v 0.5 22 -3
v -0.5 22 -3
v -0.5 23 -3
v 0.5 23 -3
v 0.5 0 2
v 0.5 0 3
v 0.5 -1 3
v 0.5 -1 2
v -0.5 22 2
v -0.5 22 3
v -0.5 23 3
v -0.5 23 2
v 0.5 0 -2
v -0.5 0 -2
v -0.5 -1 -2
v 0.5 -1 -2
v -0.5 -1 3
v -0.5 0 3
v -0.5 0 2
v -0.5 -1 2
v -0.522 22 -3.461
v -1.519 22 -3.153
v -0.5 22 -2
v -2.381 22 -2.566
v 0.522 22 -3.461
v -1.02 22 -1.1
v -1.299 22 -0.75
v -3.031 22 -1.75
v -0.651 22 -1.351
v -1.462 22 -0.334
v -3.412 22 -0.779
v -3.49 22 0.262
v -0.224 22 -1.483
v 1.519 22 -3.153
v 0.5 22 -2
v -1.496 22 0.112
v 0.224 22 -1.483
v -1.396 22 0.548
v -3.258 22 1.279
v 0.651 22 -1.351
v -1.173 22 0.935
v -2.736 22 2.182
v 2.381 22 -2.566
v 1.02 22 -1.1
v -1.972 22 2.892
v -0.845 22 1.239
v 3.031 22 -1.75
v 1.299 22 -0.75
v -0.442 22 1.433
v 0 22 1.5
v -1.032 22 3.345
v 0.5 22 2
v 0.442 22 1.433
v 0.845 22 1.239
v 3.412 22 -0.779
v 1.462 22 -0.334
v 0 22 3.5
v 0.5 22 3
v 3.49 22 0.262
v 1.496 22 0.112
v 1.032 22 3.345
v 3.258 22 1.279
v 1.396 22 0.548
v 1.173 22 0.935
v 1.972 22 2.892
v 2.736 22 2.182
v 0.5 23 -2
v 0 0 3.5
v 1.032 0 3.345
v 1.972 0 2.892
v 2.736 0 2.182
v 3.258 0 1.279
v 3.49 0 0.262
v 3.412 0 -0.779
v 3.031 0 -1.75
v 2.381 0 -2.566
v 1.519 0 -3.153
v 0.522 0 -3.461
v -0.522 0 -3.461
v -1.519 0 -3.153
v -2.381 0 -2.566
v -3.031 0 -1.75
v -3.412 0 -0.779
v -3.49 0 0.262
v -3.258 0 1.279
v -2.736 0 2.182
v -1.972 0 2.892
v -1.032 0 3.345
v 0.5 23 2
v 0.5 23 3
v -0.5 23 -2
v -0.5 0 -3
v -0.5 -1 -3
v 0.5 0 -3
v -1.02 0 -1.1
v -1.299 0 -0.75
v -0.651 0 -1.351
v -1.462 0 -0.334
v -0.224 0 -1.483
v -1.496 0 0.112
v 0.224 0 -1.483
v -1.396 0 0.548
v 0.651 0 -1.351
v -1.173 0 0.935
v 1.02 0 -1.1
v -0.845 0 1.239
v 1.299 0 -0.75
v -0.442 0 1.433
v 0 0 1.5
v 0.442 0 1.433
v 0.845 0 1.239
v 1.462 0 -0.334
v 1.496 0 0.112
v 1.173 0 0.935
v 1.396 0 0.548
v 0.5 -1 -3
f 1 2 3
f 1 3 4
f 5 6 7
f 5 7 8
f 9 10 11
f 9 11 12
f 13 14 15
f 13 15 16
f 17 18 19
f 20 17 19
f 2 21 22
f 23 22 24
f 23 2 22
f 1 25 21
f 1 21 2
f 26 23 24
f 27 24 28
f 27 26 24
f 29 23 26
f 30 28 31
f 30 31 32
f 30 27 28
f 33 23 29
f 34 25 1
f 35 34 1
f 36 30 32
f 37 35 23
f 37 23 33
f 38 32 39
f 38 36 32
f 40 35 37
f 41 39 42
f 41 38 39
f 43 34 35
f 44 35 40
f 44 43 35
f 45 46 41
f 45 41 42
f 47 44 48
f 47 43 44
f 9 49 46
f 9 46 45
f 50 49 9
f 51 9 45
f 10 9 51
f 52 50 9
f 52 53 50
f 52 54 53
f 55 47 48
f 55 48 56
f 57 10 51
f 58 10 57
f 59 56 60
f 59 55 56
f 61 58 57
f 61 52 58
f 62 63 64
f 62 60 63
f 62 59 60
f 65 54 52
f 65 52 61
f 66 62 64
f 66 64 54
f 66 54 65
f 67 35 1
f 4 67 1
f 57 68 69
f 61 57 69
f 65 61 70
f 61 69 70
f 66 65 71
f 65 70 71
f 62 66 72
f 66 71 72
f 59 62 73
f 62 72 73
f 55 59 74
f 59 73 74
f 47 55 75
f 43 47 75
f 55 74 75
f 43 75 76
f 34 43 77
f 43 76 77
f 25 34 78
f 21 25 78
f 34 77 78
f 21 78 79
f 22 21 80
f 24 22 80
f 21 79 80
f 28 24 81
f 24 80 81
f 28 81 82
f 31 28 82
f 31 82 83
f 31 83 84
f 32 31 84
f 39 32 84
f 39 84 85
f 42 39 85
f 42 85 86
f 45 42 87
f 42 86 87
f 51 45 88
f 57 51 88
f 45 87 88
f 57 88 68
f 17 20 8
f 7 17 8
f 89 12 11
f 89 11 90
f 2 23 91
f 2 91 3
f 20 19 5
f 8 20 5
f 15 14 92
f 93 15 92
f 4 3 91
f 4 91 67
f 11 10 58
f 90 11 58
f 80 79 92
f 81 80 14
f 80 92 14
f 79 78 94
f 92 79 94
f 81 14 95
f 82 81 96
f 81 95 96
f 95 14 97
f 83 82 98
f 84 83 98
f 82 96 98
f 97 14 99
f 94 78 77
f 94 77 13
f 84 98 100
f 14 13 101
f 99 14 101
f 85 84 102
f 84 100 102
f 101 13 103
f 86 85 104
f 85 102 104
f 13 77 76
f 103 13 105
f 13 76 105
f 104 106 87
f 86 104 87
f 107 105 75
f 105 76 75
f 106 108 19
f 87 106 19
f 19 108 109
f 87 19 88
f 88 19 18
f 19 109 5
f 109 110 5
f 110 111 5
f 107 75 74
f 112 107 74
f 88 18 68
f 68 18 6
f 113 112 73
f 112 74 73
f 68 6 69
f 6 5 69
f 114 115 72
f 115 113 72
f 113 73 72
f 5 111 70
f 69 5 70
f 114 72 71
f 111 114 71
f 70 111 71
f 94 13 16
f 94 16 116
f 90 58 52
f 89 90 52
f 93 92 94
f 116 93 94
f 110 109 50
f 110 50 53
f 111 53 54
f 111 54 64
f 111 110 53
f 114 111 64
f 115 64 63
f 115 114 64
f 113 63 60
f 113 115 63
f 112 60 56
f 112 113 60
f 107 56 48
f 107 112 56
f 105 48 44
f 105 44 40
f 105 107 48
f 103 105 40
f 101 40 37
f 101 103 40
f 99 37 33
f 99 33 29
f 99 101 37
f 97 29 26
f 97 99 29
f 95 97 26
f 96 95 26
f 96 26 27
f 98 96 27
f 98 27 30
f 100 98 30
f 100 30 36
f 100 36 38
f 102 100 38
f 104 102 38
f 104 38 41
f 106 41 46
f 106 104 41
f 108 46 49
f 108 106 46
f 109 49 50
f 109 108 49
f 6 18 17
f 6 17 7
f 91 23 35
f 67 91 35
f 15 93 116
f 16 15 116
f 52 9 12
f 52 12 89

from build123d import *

# Parameters (mm, degrees)
SKETCH2_R           = 3.5
SKETCH2_R_2         = 1.5
BOSS_EXTRUDE1_DEPTH = 22
SKETCH3_W           = 1
SKETCH3_H           = 1
BOSS_EXTRUDE2_DEPTH = 1


with BuildPart() as part:
    # Sketch2 → Boss-Extrude1 (new body)
    with BuildSketch(Plane(origin=(0, 0, 0), x_dir=(1, 0, 0), z_dir=(0, 1, 0))):
        with Locations(Location((0, 0, 0), (0, 0, 270))):
            Circle(SKETCH2_R)
        with Locations(Location((0, 0, 0), (0, 0, 270))):
            Circle(SKETCH2_R_2, mode=Mode.SUBTRACT)
    extrude(amount=BOSS_EXTRUDE1_DEPTH)

    # Sketch3 → Boss-Extrude2 (add)
    with BuildSketch(Plane(origin=(0, 22, 0), x_dir=(1, 0, 0), z_dir=(0, 1, 0))):
        with Locations((0, 2.5)):
            Rectangle(SKETCH3_W, SKETCH3_H)
        with Locations((0, -2.5)):
            Rectangle(SKETCH3_W, SKETCH3_H)
    boss_extrude2 = extrude(amount=BOSS_EXTRUDE2_DEPTH)

    # Mirror1: Boss-Extrude2 across plane
    add(boss_extrude2.mirror(Plane.ZX.offset(11)))


solid = part.part
